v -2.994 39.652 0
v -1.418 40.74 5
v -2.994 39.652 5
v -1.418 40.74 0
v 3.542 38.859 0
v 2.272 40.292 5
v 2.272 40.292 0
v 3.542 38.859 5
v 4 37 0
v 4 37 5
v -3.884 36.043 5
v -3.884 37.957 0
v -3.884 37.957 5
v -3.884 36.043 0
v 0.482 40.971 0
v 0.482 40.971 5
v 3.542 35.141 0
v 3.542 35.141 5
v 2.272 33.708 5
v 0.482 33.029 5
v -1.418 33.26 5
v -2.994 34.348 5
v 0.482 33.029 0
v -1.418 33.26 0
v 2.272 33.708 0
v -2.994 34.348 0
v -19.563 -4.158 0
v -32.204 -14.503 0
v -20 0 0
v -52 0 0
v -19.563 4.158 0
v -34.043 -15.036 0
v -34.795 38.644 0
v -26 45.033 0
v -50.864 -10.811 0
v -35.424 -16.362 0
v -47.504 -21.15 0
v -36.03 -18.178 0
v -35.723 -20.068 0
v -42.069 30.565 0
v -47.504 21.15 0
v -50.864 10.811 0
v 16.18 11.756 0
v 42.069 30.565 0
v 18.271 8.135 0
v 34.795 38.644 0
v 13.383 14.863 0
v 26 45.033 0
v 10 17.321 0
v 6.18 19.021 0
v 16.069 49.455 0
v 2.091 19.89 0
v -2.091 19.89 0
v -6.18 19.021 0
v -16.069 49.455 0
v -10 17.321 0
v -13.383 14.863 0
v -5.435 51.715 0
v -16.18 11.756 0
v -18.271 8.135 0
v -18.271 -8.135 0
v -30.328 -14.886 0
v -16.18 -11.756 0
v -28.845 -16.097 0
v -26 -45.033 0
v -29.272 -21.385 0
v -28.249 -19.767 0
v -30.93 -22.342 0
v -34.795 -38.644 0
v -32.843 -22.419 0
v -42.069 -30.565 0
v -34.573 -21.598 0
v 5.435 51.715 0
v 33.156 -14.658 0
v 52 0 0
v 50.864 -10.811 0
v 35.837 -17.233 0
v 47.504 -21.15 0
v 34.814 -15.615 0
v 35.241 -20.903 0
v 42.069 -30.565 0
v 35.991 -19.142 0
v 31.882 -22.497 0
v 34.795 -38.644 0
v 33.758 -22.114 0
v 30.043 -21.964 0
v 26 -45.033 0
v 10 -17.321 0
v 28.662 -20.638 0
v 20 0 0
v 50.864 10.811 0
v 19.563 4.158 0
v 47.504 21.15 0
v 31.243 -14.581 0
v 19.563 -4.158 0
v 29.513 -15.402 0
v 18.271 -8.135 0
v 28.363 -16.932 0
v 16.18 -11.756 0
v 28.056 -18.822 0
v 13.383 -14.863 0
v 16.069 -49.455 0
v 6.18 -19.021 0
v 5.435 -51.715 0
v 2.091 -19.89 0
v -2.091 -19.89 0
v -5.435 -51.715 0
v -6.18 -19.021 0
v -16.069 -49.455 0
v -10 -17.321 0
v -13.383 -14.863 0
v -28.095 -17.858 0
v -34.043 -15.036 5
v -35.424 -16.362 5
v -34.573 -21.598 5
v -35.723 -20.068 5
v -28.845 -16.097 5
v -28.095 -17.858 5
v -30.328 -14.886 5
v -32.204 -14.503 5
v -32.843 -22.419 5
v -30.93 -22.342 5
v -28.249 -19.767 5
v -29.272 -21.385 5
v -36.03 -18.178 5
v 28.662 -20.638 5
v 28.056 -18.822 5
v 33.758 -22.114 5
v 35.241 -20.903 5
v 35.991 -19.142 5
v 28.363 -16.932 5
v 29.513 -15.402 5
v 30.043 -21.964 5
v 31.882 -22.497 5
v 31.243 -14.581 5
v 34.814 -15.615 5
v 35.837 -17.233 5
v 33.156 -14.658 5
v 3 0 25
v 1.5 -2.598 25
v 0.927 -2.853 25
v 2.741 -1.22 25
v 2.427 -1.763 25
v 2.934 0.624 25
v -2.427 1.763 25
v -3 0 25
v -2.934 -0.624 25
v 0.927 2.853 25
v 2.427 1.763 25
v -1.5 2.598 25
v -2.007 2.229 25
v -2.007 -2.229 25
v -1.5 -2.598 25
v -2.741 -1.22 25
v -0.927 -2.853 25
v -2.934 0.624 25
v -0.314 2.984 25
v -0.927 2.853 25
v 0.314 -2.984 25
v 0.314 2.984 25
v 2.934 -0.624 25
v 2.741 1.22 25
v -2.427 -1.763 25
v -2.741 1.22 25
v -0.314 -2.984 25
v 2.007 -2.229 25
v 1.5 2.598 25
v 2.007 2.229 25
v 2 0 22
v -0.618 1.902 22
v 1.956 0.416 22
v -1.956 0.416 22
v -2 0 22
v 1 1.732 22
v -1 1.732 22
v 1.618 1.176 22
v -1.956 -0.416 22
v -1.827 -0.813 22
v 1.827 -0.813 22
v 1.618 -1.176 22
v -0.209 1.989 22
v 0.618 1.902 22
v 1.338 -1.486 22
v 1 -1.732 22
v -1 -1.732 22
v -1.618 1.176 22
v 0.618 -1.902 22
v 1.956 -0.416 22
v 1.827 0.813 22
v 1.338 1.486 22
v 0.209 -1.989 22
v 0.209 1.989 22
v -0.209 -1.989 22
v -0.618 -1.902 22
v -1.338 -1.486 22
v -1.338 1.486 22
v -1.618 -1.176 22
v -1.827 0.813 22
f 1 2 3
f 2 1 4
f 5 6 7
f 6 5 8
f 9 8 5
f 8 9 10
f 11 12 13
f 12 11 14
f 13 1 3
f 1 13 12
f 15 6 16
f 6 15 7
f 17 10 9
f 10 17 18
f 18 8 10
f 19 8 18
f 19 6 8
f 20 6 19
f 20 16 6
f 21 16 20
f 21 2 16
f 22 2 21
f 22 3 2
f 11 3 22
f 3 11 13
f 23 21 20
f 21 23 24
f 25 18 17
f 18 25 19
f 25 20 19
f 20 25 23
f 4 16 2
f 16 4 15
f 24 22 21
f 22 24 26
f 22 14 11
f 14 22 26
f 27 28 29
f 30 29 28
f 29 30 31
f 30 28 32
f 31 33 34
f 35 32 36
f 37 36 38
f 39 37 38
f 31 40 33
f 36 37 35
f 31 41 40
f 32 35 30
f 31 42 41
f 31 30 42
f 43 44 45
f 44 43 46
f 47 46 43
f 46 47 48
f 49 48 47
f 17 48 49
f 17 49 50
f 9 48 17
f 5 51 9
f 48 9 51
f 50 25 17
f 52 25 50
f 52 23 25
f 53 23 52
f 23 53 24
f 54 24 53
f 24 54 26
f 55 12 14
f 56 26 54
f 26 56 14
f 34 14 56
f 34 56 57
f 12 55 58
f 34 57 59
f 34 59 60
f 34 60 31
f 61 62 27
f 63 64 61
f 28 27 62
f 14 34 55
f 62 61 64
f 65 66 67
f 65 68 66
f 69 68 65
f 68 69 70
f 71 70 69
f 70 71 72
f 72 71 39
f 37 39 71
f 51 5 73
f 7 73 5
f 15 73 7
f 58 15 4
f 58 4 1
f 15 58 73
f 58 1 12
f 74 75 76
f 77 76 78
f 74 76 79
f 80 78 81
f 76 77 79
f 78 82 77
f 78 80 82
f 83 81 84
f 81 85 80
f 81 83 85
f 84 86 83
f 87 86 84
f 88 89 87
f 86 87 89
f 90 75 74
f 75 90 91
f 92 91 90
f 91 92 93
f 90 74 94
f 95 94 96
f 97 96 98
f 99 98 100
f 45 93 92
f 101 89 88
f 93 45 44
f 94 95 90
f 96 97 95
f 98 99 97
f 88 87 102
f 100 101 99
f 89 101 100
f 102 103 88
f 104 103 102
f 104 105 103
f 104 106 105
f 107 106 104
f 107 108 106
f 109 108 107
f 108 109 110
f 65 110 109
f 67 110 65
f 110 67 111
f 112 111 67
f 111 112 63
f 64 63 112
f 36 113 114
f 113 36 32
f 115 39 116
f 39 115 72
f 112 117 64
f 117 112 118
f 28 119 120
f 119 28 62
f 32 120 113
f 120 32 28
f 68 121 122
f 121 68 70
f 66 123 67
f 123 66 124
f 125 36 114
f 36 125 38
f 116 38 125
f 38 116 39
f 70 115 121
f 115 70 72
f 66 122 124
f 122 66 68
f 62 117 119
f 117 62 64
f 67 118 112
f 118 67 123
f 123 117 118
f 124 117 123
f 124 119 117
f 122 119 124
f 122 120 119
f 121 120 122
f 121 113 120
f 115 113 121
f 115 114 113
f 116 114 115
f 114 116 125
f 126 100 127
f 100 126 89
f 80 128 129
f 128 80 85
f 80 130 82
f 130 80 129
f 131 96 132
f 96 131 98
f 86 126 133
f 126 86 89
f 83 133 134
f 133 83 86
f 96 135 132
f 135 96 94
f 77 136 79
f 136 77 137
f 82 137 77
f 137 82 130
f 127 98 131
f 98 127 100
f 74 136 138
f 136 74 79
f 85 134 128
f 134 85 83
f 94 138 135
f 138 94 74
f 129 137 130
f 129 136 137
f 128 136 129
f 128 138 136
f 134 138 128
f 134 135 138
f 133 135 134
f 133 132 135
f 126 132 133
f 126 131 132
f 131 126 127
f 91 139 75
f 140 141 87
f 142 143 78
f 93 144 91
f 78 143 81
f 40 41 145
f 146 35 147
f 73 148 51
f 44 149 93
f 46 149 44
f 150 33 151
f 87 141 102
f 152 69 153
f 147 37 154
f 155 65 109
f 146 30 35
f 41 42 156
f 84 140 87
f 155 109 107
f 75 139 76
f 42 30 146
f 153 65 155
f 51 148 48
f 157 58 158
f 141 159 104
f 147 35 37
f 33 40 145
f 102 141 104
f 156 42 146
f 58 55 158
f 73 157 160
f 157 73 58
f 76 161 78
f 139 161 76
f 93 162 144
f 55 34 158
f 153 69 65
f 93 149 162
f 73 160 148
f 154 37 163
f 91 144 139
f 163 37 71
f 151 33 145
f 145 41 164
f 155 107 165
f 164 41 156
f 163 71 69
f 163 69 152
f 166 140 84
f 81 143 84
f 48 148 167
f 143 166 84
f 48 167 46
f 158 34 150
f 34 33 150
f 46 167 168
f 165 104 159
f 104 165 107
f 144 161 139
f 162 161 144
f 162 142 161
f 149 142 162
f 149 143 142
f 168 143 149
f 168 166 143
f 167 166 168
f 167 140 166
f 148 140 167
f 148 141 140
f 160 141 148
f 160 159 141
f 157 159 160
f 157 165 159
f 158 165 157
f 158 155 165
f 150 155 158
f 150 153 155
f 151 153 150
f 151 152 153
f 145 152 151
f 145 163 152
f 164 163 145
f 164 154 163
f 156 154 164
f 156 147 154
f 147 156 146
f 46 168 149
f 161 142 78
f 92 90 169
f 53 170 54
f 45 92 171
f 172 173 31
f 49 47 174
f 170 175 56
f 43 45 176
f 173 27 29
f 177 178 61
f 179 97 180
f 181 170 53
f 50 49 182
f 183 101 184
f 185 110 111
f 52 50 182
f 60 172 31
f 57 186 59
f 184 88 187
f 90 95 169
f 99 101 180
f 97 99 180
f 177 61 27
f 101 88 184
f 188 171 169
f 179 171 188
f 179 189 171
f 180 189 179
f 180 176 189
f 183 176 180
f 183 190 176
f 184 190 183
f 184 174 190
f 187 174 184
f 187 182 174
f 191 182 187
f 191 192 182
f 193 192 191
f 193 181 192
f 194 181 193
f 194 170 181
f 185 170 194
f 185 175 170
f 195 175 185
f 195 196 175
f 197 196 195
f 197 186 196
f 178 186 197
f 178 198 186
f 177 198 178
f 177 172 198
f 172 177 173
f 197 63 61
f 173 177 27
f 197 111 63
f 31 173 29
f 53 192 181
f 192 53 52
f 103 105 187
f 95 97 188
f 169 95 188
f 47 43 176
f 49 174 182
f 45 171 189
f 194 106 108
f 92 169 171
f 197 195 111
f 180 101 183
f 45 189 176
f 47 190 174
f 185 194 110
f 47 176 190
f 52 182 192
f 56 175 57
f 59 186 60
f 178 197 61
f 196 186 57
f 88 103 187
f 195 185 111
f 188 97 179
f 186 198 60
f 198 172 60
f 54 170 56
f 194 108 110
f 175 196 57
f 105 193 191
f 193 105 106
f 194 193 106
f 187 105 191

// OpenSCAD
//Title: Slug Trap
//Author: Alex English - ProtoParadigm
//Date: 5-21-2012
//License: Creative Commons

//Note: This is a beer based slug trap for killing slugs in the garden.  Just put some beer in the trap and place in the garden with the cover on.

outer_radius = 52;
inner_radius = 40;
height = 25;
post_height = 20;
wall_thickness = 3;

module slug_trap()
{
	difference()
	{
		cylinder(r1=outer_radius, r2=inner_radius, h=height);
		translate([0, 0, wall_thickness]) cylinder(r=inner_radius - wall_thickness, height - wall_thickness + 1);
	}
	for(x = [0, 360/3, 360/3*2]) rotate([0, 0, x]) translate([0, inner_radius - wall_thickness, 0]) cylinder(r=wall_thickness, h = height + post_height);
}

module slug_trap_lid()
{
	difference()
	{
		cylinder(r1=outer_radius, r2 = wall_thickness, height);
		for(x = [0, 360/3, 360/3*2]) rotate([0, 0, x]) translate([0, inner_radius - wall_thickness, 0]) cylinder(r = wall_thickness + 1, h = 5);
		cylinder(r1 = inner_radius/2, r2 = 2, height-3);
	}
}

//slug_trap();
slug_trap_lid();
